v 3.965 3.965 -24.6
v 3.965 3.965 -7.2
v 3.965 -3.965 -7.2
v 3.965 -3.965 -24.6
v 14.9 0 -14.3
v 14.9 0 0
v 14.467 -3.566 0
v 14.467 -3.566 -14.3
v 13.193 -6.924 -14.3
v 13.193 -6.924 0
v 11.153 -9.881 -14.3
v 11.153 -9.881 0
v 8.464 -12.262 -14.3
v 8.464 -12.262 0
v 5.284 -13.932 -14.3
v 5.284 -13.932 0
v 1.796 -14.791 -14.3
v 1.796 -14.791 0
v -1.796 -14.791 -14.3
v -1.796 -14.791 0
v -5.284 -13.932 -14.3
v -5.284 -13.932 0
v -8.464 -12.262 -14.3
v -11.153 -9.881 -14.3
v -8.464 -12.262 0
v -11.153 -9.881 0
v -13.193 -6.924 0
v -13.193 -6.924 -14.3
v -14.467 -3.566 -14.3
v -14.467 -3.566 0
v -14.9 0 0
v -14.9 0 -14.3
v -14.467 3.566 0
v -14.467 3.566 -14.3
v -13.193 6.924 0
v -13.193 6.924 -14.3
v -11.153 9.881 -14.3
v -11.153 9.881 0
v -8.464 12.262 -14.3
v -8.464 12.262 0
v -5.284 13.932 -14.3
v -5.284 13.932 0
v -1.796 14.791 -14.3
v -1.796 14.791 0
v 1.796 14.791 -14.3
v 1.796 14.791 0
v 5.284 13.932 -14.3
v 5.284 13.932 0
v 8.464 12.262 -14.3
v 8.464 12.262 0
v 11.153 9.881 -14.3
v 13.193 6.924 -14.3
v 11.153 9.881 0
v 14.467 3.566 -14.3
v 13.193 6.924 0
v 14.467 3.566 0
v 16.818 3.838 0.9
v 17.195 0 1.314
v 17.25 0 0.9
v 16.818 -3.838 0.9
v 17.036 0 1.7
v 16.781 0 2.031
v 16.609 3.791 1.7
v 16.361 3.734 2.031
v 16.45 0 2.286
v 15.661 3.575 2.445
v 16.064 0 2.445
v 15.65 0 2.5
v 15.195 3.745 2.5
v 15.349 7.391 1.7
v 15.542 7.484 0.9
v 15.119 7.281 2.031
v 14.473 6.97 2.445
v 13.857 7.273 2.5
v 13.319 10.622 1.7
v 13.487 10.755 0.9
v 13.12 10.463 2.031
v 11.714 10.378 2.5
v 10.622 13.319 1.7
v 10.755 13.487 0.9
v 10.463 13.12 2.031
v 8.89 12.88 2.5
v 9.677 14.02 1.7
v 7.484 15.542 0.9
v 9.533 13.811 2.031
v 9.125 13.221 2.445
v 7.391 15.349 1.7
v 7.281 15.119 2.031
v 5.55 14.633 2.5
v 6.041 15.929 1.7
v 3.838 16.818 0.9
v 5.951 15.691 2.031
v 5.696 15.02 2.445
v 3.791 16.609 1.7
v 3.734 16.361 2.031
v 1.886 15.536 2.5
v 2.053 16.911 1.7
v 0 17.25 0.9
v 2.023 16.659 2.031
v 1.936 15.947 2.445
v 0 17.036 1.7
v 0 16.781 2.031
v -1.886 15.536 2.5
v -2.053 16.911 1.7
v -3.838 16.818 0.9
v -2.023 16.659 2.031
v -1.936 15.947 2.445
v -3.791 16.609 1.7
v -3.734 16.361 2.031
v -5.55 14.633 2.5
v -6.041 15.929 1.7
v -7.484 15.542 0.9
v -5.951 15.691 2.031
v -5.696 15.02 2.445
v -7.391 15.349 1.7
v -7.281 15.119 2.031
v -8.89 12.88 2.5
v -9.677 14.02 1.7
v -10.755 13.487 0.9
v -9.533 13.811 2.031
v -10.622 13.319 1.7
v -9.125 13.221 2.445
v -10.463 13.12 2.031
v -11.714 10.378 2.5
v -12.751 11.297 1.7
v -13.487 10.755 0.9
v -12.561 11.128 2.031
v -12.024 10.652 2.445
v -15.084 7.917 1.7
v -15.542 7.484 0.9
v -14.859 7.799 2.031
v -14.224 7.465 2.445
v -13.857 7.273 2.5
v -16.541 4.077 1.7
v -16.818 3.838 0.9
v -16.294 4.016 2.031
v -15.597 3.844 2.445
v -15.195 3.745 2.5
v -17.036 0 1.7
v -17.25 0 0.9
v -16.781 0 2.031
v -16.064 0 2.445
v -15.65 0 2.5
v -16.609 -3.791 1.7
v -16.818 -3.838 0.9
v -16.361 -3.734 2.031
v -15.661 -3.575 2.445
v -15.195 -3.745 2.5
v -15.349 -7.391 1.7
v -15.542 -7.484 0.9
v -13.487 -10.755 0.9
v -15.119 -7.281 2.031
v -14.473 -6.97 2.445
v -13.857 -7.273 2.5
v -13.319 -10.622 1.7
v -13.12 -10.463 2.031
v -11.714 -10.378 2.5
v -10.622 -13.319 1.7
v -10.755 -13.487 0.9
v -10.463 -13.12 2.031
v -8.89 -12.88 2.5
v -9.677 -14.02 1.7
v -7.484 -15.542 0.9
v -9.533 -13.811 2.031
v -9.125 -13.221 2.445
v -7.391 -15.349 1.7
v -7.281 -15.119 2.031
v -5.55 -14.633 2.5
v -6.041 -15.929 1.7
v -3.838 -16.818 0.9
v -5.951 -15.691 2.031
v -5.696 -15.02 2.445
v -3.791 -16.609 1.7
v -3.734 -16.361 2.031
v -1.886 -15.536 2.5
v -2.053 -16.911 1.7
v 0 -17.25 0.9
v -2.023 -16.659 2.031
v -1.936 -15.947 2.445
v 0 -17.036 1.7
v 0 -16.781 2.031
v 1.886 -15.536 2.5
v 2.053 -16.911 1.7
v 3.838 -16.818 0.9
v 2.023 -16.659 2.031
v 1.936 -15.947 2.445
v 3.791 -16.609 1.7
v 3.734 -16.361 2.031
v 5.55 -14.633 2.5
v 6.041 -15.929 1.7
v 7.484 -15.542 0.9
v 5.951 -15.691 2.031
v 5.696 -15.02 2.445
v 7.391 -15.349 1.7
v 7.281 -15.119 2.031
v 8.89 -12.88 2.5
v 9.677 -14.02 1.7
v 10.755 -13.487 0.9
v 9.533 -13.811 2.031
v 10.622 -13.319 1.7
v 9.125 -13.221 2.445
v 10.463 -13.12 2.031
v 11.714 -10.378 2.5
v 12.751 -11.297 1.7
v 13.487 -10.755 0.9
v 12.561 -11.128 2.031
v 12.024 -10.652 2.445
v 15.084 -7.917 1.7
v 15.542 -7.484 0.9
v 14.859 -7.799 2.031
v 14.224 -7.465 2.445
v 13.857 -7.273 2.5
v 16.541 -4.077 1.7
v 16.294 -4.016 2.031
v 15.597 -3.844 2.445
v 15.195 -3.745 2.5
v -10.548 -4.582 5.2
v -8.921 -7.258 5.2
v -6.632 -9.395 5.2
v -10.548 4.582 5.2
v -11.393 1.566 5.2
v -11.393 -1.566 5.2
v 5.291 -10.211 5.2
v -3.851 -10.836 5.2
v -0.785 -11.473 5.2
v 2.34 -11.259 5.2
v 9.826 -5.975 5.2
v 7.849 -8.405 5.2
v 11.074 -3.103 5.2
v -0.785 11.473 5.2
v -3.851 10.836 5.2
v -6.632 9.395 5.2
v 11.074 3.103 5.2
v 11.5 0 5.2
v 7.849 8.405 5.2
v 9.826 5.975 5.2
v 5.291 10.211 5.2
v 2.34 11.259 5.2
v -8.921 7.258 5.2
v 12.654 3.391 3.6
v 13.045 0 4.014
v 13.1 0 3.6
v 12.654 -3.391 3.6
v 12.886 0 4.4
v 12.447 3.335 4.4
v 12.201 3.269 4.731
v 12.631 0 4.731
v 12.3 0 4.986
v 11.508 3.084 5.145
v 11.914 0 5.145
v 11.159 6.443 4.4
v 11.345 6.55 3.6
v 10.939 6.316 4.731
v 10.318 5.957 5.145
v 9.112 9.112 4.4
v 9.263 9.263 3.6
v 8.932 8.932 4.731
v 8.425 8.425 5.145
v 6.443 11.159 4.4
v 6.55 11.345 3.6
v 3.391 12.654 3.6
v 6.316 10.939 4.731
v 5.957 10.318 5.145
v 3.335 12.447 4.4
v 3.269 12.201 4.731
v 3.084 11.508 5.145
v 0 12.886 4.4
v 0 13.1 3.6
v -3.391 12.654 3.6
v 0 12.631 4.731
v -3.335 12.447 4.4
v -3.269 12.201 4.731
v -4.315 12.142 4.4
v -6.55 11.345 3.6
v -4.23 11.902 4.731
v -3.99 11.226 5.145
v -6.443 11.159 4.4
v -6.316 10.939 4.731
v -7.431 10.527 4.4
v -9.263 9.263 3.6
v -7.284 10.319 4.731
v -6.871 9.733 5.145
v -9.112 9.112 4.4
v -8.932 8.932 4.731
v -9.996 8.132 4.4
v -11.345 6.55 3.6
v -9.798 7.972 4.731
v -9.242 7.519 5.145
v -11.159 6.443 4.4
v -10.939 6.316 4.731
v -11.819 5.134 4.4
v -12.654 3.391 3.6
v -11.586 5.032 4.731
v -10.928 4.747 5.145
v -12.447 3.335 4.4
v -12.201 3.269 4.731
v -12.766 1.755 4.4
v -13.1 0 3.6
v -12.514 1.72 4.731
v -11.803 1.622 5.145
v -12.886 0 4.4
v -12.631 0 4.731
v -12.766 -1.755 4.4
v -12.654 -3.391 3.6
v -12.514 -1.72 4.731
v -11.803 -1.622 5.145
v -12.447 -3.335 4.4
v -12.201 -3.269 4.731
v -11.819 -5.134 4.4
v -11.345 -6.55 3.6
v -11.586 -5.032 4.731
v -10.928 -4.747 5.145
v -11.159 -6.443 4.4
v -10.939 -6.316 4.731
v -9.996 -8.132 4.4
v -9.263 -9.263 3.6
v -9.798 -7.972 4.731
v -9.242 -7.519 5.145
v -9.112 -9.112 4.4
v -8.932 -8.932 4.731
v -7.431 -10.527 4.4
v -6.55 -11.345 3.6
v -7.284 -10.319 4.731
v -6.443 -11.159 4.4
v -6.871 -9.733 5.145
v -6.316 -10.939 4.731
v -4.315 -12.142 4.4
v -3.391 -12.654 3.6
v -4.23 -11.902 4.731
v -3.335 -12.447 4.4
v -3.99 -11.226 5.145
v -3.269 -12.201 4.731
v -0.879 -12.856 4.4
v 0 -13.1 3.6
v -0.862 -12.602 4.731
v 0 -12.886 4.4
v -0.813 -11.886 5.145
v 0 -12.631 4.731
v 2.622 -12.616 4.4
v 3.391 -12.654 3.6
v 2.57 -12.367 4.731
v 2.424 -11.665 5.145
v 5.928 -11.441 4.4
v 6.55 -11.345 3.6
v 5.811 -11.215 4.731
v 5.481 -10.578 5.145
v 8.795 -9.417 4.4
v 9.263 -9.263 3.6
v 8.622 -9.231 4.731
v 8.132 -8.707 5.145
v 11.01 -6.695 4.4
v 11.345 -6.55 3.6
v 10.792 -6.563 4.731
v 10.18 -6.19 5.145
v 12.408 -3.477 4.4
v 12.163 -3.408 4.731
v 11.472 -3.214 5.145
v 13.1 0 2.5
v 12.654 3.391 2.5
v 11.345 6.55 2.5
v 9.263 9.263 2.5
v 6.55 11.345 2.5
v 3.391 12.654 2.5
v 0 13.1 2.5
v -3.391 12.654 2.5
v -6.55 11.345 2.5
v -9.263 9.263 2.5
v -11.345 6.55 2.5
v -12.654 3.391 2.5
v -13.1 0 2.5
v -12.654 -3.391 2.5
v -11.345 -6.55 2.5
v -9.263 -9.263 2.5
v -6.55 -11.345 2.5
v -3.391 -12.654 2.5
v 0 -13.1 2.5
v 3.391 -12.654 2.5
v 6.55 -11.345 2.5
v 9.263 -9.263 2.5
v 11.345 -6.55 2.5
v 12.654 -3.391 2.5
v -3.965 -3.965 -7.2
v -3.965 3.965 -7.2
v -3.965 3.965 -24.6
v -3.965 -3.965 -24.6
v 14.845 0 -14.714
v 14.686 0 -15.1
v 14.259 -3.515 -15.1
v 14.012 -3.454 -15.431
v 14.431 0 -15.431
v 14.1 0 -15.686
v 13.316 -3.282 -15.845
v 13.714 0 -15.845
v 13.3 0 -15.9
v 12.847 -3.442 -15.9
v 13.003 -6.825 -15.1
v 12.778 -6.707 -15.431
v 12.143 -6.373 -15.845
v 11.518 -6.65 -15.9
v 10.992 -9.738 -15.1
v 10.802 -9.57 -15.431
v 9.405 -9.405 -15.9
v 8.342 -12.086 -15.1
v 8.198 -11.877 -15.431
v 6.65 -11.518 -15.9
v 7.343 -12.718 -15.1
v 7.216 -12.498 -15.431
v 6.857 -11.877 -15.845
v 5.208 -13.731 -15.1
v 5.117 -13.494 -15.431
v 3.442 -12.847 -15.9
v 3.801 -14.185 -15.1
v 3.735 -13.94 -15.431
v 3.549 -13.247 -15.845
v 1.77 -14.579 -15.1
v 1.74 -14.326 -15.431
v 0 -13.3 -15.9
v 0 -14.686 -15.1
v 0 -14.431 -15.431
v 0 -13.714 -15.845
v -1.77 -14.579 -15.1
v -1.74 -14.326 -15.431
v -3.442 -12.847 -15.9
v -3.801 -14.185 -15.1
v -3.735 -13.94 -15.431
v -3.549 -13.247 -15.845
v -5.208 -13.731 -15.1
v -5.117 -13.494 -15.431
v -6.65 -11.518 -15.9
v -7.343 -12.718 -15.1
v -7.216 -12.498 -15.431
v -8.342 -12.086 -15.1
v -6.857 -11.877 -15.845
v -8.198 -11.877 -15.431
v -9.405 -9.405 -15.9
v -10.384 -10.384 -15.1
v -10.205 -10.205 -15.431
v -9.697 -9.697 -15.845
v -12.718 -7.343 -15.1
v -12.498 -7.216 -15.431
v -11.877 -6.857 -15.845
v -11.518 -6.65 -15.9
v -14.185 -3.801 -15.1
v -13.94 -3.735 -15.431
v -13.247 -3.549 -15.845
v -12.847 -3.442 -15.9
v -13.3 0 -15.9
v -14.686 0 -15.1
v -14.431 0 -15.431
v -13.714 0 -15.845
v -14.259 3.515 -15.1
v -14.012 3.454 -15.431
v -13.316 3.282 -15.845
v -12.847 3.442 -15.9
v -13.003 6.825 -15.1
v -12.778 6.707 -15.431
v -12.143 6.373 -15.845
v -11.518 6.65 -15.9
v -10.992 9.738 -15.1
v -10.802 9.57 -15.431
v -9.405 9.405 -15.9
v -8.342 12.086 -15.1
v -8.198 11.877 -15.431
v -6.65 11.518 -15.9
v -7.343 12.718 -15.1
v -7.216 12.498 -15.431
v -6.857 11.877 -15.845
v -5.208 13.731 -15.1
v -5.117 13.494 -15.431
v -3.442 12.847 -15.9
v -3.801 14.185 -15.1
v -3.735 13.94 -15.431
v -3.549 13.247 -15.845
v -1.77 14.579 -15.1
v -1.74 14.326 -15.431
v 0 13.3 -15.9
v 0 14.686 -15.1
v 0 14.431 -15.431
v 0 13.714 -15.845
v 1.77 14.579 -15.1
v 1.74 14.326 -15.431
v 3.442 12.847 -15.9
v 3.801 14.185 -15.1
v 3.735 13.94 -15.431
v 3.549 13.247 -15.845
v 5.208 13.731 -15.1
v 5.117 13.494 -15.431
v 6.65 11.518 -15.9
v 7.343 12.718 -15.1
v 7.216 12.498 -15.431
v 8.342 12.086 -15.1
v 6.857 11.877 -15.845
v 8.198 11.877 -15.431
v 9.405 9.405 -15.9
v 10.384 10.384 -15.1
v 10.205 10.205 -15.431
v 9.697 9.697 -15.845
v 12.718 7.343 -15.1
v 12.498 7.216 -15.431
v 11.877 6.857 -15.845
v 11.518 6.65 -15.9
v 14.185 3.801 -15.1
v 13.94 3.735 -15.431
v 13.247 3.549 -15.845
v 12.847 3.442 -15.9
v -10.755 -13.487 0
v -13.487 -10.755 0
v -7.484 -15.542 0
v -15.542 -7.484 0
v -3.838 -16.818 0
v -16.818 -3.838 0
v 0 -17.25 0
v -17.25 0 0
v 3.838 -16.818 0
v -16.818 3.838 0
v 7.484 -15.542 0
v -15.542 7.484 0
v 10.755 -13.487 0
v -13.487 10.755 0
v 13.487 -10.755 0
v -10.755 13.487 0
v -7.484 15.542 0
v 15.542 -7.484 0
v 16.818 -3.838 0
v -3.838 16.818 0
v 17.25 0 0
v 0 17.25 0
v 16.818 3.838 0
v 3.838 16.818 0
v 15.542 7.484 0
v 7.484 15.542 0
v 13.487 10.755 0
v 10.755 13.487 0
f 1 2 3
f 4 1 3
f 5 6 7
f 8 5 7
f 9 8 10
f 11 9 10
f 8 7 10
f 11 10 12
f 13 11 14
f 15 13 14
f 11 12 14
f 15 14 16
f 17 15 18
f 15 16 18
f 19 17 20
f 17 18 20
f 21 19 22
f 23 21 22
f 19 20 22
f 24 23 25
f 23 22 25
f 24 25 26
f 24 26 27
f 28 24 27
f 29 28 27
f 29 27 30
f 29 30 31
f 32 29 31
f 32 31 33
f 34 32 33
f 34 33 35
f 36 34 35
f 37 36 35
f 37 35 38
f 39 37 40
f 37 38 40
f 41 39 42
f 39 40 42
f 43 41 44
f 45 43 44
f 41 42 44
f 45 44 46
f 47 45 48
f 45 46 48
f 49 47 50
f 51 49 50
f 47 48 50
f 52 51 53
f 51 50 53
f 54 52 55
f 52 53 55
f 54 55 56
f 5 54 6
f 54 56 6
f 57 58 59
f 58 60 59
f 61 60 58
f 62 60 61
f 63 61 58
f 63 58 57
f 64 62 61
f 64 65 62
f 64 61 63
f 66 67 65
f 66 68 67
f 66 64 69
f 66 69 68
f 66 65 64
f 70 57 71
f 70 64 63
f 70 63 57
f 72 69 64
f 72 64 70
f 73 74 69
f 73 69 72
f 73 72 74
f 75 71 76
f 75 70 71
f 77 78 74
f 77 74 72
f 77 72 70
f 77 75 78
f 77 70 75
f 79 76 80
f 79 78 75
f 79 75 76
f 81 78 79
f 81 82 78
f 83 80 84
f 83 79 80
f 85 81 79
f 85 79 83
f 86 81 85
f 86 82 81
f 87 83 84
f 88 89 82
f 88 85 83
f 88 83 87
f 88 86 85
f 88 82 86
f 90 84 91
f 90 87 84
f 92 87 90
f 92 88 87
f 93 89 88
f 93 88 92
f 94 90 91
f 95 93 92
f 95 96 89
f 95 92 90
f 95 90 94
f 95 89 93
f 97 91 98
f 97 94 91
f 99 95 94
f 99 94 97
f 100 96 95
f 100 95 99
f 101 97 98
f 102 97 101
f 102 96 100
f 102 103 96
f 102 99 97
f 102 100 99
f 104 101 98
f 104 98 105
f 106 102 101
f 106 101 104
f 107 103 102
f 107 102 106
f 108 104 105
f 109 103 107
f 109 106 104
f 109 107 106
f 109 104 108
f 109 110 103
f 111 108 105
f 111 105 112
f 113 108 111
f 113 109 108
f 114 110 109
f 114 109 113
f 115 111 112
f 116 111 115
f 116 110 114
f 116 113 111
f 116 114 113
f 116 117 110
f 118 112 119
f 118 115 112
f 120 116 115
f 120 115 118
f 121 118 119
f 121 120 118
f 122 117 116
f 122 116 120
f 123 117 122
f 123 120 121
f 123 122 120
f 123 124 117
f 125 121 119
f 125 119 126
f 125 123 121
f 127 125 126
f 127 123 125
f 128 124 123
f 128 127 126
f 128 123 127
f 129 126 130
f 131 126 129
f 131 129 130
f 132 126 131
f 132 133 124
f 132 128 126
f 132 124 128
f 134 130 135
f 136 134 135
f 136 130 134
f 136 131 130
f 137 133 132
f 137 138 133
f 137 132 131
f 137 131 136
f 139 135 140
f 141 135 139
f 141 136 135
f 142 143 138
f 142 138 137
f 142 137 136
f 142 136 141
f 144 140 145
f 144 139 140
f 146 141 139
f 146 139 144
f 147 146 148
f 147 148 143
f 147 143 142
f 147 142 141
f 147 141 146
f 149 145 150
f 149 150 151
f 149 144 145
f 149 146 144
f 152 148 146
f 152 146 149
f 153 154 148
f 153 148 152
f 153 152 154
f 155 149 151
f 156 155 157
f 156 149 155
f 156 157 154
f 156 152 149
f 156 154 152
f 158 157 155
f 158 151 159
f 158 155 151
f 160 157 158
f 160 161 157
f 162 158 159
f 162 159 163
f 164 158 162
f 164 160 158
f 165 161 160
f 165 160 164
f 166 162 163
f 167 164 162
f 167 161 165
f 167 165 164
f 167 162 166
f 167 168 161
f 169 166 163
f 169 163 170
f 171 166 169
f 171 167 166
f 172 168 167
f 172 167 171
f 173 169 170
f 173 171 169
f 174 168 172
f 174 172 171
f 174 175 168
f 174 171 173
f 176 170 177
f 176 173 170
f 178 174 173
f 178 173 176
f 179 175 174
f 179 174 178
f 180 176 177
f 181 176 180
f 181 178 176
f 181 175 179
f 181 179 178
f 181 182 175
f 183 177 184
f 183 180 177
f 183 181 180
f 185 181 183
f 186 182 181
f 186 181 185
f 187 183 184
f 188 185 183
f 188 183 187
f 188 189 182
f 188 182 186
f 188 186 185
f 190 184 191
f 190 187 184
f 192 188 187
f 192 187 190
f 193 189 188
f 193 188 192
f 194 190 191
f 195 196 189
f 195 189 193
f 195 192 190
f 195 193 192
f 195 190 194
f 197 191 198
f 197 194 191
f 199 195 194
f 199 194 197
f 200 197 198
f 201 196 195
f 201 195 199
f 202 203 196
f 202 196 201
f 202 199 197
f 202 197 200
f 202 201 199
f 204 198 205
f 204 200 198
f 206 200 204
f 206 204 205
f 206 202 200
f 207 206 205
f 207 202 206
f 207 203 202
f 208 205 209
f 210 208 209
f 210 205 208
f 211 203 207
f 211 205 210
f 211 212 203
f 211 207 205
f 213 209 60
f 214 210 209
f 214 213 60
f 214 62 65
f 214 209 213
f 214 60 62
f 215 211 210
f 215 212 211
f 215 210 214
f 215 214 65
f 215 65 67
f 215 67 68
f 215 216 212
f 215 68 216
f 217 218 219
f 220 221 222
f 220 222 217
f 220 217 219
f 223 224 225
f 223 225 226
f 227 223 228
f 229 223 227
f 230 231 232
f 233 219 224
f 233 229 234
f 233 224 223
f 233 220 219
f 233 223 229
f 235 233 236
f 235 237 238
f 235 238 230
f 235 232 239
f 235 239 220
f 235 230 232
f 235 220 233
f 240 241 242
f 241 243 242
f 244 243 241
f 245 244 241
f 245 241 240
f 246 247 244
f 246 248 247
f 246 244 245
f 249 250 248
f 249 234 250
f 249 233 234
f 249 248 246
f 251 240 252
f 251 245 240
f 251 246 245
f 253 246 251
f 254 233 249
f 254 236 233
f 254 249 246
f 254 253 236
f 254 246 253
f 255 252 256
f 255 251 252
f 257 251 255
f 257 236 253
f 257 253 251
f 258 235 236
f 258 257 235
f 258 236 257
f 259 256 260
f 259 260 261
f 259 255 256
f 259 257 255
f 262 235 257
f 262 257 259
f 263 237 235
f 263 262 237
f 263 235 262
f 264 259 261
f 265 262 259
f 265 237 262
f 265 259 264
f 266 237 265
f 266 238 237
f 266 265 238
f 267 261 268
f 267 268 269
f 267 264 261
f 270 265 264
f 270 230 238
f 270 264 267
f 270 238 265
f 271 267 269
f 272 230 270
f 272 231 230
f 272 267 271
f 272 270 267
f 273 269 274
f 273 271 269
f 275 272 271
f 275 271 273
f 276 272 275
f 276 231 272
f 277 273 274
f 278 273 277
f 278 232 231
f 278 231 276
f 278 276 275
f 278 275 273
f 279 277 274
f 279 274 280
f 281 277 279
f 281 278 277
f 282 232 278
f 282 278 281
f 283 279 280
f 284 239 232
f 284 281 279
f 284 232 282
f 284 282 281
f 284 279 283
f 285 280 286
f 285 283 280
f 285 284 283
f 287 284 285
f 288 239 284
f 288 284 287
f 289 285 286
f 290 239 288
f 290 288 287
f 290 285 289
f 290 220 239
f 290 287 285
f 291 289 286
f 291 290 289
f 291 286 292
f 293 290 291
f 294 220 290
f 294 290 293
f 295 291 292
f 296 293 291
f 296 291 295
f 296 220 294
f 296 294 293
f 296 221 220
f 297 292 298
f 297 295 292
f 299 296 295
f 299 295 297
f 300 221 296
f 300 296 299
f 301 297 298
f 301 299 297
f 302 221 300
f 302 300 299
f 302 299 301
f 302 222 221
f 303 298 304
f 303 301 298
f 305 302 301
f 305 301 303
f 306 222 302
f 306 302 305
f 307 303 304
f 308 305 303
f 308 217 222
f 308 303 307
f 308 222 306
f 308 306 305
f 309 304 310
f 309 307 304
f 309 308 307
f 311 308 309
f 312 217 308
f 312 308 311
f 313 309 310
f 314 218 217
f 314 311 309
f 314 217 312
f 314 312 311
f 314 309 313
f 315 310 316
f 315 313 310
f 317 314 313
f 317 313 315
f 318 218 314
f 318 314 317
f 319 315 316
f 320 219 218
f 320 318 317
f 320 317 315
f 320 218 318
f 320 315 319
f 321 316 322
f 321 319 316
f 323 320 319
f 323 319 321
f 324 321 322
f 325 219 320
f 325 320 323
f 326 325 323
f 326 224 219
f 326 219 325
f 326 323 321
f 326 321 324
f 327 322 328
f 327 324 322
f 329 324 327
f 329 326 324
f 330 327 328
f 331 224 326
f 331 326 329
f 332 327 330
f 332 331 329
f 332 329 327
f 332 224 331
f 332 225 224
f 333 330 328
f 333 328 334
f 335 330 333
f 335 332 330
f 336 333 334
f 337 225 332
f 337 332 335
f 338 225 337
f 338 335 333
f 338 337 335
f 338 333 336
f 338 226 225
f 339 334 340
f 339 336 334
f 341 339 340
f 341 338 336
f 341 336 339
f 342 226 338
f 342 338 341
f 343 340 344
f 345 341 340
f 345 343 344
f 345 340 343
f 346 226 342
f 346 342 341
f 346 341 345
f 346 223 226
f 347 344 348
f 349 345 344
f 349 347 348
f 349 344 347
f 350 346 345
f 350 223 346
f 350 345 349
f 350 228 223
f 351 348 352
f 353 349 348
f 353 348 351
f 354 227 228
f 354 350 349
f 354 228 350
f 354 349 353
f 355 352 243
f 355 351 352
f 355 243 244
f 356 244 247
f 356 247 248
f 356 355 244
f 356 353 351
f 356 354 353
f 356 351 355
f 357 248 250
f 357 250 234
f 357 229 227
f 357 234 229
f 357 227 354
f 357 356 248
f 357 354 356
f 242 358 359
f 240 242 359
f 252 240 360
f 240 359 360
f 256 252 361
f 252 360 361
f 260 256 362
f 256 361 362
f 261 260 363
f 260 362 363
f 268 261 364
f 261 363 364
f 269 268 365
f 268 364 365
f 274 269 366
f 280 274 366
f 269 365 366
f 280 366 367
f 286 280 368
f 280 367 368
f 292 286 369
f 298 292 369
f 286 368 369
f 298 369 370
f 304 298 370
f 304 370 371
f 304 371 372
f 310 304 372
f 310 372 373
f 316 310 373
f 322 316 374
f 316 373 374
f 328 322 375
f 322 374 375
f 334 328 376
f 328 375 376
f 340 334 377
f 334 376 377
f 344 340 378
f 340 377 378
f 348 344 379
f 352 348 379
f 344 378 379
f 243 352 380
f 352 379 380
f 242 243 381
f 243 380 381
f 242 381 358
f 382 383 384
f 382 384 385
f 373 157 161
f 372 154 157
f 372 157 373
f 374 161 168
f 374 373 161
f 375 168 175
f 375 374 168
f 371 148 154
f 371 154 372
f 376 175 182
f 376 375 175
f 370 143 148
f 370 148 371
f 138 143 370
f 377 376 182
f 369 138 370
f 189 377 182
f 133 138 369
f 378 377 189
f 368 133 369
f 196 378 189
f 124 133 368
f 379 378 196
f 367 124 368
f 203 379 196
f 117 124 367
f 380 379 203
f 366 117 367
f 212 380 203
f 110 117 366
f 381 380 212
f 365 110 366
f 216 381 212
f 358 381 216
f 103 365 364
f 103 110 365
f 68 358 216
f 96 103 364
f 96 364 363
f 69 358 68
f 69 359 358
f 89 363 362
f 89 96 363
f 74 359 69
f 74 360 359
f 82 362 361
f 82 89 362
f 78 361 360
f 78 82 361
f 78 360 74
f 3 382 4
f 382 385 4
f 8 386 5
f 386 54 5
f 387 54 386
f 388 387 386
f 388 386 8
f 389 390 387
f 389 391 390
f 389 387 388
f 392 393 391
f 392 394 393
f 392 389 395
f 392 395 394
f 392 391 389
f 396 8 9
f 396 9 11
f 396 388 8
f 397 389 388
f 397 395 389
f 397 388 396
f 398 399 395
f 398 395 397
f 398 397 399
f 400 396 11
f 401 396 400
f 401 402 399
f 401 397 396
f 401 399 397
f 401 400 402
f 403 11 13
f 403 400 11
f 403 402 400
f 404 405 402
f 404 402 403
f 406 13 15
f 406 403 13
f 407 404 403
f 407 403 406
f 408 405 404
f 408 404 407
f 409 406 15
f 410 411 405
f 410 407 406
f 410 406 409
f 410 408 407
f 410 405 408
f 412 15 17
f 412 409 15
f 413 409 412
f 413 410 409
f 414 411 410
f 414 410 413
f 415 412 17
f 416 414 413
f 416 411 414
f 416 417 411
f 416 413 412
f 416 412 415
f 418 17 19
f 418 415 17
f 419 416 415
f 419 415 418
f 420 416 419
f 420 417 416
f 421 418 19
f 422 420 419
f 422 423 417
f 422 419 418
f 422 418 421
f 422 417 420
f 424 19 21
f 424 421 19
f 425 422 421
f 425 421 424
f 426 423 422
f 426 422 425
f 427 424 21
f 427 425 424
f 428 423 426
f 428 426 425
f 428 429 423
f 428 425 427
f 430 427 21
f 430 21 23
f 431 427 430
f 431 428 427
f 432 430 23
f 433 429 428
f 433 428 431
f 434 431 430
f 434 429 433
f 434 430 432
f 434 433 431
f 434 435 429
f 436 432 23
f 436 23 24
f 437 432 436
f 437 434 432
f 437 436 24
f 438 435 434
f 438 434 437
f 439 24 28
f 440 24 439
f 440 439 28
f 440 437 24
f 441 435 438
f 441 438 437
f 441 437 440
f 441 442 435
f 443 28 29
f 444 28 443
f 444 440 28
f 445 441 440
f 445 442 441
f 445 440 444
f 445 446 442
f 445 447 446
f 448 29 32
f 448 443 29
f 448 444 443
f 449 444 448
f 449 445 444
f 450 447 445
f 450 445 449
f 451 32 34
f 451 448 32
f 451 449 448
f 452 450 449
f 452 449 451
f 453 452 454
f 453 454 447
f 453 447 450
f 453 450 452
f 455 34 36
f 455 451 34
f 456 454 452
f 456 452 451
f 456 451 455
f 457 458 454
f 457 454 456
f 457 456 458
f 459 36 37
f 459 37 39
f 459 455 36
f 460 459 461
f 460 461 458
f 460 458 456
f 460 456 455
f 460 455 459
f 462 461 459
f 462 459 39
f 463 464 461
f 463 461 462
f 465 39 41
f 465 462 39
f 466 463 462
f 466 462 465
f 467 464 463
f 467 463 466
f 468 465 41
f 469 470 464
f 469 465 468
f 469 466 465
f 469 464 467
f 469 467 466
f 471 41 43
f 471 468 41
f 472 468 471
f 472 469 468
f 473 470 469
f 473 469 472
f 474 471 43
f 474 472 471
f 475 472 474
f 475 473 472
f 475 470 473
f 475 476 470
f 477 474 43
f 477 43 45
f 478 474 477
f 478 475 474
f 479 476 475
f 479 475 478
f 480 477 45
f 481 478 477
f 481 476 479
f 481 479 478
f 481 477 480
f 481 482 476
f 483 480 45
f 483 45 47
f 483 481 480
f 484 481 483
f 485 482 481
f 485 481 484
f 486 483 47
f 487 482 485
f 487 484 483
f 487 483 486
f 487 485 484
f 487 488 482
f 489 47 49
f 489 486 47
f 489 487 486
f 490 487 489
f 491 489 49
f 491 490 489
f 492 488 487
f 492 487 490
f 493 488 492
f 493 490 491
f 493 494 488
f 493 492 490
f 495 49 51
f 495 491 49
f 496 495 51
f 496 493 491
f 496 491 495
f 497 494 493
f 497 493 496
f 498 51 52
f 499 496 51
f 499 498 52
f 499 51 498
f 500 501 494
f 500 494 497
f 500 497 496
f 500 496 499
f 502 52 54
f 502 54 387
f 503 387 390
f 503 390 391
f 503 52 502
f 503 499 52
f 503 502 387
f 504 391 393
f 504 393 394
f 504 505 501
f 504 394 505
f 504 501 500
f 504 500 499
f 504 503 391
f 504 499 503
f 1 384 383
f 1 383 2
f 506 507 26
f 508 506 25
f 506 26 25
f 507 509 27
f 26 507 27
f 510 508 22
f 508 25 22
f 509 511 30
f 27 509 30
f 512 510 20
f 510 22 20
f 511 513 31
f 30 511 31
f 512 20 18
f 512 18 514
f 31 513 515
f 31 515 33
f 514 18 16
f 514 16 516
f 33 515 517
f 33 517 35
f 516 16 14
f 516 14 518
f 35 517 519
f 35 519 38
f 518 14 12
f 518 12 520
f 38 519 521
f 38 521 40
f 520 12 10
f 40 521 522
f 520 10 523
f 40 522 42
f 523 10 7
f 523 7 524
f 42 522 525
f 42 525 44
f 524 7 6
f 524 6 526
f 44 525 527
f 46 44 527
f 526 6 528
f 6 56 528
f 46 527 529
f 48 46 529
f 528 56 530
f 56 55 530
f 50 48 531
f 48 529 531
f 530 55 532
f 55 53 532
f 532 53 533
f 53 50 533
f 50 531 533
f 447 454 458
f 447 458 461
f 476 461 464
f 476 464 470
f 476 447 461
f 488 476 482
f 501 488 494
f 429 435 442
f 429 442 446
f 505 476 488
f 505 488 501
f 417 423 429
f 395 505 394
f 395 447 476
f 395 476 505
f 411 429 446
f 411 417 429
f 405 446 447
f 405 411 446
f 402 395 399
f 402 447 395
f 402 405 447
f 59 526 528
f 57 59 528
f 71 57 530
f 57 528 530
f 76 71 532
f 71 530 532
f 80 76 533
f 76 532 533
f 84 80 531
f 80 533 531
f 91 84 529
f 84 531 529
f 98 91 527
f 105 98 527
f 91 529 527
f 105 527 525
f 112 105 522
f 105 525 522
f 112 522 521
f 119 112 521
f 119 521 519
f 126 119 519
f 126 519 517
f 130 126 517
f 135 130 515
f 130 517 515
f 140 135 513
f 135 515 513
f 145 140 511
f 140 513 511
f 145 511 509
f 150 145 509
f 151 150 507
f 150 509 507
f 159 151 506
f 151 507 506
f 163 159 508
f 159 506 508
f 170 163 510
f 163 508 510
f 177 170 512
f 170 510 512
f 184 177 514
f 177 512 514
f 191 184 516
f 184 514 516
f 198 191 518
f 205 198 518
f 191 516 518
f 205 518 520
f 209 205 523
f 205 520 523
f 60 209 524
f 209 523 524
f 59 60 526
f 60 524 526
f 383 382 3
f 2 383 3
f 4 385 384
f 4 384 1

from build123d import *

# Parameters (mm, degrees)
F0_R      = 17.25
F1_DEPTH  = 2.5
F2_R      = 1.6
F3_R      = 13.1
F4_DEPTH  = 2.7
F5_R      = 1.6
F6_R      = 14.9
F7_DEPTH  = 15.9
F8_R      = 1.6
F9_W      = 7.929822
F9_H      = 7.929822
F10_DEPTH = 8.7


with BuildPart() as f1:
    # F0 (on Top) → F1 (new body)
    with BuildSketch(Plane.XY):
        Circle(F0_R)
    extrude(amount=F1_DEPTH)

    # F2
    f2_edges = [f1.edges().sort_by_distance(p)[0] for p in [
        (-17.25, 0, 2.5),
    ]]
    fillet(f2_edges, radius=F2_R)

    # F3 (on face) → F4 (join)
    with BuildSketch(Plane.XY.offset(2.5)):
        Circle(F3_R)
    extrude(amount=F4_DEPTH)

    # F5
    f5_edges = [f1.edges().sort_by_distance(p)[0] for p in [
        (-13.1, 0, 5.2),
    ]]
    fillet(f5_edges, radius=F5_R)

    # F6 (on face) → F7 (join)
    with BuildSketch(Plane(origin=(0, 0, 0), x_dir=(1, 0, 0), z_dir=(0, 0, -1))):
        Circle(F6_R)
    extrude(amount=F7_DEPTH)

    # F8
    f8_edges = [f1.edges().sort_by_distance(p)[0] for p in [
        (-14.9, 0, -15.9),
    ]]
    fillet(f8_edges, radius=F8_R)


with BuildPart() as f10:
    # F9 (on face) → F10 (new body, symmetric)
    with BuildSketch(Plane(origin=(0, 0, -15.9), x_dir=(1, 0, 0), z_dir=(0, 0, -1))):
        Rectangle(F9_W, F9_H)
    extrude(amount=F10_DEPTH, both=True)


solid = Compound([f1.part, f10.part])
